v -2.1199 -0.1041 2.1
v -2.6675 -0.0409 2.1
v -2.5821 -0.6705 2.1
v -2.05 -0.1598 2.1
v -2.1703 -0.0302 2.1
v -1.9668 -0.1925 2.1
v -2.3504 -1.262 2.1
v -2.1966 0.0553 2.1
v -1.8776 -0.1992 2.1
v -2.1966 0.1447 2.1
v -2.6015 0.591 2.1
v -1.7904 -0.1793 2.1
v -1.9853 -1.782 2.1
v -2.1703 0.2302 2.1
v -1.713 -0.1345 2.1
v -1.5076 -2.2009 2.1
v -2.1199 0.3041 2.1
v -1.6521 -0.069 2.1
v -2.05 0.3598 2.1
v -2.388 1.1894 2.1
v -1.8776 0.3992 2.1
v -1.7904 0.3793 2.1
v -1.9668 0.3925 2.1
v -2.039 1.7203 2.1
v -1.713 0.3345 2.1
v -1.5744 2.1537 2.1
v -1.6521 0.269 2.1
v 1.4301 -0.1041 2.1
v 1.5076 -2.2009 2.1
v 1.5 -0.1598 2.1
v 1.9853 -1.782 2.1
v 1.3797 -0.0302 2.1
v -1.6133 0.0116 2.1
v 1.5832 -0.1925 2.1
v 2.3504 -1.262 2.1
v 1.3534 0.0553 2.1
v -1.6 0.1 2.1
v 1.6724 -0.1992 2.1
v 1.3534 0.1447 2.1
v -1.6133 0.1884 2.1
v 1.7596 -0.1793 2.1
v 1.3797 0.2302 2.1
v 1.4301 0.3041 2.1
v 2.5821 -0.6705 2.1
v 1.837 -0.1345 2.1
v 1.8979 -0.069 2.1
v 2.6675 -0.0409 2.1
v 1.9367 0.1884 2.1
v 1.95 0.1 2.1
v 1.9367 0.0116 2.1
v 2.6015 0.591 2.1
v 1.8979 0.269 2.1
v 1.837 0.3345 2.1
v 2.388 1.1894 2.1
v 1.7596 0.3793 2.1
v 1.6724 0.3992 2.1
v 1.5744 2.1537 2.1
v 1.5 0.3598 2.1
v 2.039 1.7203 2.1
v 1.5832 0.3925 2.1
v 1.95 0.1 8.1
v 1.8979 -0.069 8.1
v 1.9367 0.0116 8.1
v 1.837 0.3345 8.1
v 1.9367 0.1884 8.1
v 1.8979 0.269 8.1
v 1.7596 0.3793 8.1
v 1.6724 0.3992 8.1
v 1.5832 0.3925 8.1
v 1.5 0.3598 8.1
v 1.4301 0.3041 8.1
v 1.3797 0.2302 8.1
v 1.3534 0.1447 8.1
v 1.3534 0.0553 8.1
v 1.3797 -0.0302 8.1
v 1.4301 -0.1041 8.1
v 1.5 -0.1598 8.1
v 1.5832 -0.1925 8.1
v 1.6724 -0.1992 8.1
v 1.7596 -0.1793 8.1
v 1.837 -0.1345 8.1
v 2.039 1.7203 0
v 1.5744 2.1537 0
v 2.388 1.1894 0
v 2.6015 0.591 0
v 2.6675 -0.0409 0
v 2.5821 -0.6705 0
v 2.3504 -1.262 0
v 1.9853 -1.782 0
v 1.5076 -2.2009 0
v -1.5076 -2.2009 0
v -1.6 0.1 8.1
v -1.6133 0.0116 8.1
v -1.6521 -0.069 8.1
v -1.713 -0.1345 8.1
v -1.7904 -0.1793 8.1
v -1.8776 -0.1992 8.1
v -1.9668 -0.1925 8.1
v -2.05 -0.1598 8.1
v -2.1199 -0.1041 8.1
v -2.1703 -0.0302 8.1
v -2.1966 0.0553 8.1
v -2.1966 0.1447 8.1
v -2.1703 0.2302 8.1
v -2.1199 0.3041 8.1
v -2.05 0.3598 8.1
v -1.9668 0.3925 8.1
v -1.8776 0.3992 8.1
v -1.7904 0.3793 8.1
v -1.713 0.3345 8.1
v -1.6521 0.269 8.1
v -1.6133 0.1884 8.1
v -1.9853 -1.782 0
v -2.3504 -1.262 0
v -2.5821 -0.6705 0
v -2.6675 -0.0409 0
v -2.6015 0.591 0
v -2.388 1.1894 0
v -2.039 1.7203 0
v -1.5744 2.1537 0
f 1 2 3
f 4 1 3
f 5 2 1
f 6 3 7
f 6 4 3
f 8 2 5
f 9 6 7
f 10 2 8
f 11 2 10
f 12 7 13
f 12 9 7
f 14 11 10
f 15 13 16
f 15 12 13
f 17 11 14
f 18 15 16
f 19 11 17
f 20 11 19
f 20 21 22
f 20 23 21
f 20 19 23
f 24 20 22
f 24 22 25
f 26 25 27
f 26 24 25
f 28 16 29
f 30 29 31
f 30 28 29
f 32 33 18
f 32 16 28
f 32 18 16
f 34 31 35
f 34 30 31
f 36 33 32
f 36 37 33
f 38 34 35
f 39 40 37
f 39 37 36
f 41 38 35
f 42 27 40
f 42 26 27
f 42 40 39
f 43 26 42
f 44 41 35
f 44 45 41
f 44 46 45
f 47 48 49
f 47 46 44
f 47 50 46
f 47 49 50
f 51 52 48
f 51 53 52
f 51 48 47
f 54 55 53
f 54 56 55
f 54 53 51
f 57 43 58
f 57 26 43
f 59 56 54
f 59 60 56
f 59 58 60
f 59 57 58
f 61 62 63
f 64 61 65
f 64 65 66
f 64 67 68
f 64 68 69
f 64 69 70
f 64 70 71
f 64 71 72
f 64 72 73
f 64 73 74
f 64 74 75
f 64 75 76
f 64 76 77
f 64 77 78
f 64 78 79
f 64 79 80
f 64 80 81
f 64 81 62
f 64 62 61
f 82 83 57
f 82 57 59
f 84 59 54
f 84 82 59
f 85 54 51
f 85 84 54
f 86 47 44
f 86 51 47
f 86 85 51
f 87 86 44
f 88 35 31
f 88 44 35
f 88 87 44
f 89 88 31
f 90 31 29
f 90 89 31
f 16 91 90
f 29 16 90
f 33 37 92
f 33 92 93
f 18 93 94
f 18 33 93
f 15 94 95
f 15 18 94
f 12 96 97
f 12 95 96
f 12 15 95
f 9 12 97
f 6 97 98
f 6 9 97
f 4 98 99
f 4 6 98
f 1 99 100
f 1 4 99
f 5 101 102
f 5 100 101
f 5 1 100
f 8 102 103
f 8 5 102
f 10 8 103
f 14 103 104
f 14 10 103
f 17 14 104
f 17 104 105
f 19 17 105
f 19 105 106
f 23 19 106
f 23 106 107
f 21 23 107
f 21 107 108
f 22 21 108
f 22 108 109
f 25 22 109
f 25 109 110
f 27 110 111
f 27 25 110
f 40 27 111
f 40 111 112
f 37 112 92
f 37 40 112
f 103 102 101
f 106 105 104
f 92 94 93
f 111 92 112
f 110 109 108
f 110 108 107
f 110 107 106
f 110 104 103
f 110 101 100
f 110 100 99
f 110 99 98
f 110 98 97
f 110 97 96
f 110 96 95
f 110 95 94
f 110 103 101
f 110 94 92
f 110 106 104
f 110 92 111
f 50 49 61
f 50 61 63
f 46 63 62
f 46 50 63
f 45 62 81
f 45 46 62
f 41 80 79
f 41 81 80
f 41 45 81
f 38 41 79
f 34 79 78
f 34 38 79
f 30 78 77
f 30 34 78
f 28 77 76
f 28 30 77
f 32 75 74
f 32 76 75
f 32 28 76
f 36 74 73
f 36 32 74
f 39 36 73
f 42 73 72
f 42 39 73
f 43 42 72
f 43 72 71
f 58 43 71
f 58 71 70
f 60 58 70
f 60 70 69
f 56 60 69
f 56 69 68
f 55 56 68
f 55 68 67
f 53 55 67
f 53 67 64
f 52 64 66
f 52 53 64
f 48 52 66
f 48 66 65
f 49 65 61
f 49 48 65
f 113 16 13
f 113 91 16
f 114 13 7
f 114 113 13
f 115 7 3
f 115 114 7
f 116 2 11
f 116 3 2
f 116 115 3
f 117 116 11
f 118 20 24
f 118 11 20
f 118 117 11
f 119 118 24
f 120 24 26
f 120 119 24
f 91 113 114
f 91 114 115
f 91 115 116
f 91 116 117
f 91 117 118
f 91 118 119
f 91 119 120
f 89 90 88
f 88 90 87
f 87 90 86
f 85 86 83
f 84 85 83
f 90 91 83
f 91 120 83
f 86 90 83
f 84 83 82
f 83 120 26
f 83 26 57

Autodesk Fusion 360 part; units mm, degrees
sketch "Sketch2" plane through (0, 0, 0) normal (0, 0, 1) x (1, 0, 0)
  line L0 (-1.5076, -2.2009) -> (1.5076, -2.2009)
  line L1 (-1.5744, 2.1537) -> (1.5744, 2.1537)
  arc A0 (1.5076, -2.2009) -> (1.5744, 2.1537) centre (0, 0) ccw
  arc A1 (-1.5744, 2.1537) -> (-1.5076, -2.2009) centre (0, 0) ccw
  circle A2 centre (-1.9, 0.1) radius 0.3
  circle A3 centre (1.65, 0.1) radius 0.3
  dimension "d3" = 0.6
  dimension "d4" = 0.6
extrude "Extrude1" add sketch "Sketch2" along normal blind 2.1 contours L0 L1 A0 A1 | A2 | A3
extrude "Extrude2" add sketch "Sketch2" along normal blind 6 from surface at 2.1 contours A2 | A3
